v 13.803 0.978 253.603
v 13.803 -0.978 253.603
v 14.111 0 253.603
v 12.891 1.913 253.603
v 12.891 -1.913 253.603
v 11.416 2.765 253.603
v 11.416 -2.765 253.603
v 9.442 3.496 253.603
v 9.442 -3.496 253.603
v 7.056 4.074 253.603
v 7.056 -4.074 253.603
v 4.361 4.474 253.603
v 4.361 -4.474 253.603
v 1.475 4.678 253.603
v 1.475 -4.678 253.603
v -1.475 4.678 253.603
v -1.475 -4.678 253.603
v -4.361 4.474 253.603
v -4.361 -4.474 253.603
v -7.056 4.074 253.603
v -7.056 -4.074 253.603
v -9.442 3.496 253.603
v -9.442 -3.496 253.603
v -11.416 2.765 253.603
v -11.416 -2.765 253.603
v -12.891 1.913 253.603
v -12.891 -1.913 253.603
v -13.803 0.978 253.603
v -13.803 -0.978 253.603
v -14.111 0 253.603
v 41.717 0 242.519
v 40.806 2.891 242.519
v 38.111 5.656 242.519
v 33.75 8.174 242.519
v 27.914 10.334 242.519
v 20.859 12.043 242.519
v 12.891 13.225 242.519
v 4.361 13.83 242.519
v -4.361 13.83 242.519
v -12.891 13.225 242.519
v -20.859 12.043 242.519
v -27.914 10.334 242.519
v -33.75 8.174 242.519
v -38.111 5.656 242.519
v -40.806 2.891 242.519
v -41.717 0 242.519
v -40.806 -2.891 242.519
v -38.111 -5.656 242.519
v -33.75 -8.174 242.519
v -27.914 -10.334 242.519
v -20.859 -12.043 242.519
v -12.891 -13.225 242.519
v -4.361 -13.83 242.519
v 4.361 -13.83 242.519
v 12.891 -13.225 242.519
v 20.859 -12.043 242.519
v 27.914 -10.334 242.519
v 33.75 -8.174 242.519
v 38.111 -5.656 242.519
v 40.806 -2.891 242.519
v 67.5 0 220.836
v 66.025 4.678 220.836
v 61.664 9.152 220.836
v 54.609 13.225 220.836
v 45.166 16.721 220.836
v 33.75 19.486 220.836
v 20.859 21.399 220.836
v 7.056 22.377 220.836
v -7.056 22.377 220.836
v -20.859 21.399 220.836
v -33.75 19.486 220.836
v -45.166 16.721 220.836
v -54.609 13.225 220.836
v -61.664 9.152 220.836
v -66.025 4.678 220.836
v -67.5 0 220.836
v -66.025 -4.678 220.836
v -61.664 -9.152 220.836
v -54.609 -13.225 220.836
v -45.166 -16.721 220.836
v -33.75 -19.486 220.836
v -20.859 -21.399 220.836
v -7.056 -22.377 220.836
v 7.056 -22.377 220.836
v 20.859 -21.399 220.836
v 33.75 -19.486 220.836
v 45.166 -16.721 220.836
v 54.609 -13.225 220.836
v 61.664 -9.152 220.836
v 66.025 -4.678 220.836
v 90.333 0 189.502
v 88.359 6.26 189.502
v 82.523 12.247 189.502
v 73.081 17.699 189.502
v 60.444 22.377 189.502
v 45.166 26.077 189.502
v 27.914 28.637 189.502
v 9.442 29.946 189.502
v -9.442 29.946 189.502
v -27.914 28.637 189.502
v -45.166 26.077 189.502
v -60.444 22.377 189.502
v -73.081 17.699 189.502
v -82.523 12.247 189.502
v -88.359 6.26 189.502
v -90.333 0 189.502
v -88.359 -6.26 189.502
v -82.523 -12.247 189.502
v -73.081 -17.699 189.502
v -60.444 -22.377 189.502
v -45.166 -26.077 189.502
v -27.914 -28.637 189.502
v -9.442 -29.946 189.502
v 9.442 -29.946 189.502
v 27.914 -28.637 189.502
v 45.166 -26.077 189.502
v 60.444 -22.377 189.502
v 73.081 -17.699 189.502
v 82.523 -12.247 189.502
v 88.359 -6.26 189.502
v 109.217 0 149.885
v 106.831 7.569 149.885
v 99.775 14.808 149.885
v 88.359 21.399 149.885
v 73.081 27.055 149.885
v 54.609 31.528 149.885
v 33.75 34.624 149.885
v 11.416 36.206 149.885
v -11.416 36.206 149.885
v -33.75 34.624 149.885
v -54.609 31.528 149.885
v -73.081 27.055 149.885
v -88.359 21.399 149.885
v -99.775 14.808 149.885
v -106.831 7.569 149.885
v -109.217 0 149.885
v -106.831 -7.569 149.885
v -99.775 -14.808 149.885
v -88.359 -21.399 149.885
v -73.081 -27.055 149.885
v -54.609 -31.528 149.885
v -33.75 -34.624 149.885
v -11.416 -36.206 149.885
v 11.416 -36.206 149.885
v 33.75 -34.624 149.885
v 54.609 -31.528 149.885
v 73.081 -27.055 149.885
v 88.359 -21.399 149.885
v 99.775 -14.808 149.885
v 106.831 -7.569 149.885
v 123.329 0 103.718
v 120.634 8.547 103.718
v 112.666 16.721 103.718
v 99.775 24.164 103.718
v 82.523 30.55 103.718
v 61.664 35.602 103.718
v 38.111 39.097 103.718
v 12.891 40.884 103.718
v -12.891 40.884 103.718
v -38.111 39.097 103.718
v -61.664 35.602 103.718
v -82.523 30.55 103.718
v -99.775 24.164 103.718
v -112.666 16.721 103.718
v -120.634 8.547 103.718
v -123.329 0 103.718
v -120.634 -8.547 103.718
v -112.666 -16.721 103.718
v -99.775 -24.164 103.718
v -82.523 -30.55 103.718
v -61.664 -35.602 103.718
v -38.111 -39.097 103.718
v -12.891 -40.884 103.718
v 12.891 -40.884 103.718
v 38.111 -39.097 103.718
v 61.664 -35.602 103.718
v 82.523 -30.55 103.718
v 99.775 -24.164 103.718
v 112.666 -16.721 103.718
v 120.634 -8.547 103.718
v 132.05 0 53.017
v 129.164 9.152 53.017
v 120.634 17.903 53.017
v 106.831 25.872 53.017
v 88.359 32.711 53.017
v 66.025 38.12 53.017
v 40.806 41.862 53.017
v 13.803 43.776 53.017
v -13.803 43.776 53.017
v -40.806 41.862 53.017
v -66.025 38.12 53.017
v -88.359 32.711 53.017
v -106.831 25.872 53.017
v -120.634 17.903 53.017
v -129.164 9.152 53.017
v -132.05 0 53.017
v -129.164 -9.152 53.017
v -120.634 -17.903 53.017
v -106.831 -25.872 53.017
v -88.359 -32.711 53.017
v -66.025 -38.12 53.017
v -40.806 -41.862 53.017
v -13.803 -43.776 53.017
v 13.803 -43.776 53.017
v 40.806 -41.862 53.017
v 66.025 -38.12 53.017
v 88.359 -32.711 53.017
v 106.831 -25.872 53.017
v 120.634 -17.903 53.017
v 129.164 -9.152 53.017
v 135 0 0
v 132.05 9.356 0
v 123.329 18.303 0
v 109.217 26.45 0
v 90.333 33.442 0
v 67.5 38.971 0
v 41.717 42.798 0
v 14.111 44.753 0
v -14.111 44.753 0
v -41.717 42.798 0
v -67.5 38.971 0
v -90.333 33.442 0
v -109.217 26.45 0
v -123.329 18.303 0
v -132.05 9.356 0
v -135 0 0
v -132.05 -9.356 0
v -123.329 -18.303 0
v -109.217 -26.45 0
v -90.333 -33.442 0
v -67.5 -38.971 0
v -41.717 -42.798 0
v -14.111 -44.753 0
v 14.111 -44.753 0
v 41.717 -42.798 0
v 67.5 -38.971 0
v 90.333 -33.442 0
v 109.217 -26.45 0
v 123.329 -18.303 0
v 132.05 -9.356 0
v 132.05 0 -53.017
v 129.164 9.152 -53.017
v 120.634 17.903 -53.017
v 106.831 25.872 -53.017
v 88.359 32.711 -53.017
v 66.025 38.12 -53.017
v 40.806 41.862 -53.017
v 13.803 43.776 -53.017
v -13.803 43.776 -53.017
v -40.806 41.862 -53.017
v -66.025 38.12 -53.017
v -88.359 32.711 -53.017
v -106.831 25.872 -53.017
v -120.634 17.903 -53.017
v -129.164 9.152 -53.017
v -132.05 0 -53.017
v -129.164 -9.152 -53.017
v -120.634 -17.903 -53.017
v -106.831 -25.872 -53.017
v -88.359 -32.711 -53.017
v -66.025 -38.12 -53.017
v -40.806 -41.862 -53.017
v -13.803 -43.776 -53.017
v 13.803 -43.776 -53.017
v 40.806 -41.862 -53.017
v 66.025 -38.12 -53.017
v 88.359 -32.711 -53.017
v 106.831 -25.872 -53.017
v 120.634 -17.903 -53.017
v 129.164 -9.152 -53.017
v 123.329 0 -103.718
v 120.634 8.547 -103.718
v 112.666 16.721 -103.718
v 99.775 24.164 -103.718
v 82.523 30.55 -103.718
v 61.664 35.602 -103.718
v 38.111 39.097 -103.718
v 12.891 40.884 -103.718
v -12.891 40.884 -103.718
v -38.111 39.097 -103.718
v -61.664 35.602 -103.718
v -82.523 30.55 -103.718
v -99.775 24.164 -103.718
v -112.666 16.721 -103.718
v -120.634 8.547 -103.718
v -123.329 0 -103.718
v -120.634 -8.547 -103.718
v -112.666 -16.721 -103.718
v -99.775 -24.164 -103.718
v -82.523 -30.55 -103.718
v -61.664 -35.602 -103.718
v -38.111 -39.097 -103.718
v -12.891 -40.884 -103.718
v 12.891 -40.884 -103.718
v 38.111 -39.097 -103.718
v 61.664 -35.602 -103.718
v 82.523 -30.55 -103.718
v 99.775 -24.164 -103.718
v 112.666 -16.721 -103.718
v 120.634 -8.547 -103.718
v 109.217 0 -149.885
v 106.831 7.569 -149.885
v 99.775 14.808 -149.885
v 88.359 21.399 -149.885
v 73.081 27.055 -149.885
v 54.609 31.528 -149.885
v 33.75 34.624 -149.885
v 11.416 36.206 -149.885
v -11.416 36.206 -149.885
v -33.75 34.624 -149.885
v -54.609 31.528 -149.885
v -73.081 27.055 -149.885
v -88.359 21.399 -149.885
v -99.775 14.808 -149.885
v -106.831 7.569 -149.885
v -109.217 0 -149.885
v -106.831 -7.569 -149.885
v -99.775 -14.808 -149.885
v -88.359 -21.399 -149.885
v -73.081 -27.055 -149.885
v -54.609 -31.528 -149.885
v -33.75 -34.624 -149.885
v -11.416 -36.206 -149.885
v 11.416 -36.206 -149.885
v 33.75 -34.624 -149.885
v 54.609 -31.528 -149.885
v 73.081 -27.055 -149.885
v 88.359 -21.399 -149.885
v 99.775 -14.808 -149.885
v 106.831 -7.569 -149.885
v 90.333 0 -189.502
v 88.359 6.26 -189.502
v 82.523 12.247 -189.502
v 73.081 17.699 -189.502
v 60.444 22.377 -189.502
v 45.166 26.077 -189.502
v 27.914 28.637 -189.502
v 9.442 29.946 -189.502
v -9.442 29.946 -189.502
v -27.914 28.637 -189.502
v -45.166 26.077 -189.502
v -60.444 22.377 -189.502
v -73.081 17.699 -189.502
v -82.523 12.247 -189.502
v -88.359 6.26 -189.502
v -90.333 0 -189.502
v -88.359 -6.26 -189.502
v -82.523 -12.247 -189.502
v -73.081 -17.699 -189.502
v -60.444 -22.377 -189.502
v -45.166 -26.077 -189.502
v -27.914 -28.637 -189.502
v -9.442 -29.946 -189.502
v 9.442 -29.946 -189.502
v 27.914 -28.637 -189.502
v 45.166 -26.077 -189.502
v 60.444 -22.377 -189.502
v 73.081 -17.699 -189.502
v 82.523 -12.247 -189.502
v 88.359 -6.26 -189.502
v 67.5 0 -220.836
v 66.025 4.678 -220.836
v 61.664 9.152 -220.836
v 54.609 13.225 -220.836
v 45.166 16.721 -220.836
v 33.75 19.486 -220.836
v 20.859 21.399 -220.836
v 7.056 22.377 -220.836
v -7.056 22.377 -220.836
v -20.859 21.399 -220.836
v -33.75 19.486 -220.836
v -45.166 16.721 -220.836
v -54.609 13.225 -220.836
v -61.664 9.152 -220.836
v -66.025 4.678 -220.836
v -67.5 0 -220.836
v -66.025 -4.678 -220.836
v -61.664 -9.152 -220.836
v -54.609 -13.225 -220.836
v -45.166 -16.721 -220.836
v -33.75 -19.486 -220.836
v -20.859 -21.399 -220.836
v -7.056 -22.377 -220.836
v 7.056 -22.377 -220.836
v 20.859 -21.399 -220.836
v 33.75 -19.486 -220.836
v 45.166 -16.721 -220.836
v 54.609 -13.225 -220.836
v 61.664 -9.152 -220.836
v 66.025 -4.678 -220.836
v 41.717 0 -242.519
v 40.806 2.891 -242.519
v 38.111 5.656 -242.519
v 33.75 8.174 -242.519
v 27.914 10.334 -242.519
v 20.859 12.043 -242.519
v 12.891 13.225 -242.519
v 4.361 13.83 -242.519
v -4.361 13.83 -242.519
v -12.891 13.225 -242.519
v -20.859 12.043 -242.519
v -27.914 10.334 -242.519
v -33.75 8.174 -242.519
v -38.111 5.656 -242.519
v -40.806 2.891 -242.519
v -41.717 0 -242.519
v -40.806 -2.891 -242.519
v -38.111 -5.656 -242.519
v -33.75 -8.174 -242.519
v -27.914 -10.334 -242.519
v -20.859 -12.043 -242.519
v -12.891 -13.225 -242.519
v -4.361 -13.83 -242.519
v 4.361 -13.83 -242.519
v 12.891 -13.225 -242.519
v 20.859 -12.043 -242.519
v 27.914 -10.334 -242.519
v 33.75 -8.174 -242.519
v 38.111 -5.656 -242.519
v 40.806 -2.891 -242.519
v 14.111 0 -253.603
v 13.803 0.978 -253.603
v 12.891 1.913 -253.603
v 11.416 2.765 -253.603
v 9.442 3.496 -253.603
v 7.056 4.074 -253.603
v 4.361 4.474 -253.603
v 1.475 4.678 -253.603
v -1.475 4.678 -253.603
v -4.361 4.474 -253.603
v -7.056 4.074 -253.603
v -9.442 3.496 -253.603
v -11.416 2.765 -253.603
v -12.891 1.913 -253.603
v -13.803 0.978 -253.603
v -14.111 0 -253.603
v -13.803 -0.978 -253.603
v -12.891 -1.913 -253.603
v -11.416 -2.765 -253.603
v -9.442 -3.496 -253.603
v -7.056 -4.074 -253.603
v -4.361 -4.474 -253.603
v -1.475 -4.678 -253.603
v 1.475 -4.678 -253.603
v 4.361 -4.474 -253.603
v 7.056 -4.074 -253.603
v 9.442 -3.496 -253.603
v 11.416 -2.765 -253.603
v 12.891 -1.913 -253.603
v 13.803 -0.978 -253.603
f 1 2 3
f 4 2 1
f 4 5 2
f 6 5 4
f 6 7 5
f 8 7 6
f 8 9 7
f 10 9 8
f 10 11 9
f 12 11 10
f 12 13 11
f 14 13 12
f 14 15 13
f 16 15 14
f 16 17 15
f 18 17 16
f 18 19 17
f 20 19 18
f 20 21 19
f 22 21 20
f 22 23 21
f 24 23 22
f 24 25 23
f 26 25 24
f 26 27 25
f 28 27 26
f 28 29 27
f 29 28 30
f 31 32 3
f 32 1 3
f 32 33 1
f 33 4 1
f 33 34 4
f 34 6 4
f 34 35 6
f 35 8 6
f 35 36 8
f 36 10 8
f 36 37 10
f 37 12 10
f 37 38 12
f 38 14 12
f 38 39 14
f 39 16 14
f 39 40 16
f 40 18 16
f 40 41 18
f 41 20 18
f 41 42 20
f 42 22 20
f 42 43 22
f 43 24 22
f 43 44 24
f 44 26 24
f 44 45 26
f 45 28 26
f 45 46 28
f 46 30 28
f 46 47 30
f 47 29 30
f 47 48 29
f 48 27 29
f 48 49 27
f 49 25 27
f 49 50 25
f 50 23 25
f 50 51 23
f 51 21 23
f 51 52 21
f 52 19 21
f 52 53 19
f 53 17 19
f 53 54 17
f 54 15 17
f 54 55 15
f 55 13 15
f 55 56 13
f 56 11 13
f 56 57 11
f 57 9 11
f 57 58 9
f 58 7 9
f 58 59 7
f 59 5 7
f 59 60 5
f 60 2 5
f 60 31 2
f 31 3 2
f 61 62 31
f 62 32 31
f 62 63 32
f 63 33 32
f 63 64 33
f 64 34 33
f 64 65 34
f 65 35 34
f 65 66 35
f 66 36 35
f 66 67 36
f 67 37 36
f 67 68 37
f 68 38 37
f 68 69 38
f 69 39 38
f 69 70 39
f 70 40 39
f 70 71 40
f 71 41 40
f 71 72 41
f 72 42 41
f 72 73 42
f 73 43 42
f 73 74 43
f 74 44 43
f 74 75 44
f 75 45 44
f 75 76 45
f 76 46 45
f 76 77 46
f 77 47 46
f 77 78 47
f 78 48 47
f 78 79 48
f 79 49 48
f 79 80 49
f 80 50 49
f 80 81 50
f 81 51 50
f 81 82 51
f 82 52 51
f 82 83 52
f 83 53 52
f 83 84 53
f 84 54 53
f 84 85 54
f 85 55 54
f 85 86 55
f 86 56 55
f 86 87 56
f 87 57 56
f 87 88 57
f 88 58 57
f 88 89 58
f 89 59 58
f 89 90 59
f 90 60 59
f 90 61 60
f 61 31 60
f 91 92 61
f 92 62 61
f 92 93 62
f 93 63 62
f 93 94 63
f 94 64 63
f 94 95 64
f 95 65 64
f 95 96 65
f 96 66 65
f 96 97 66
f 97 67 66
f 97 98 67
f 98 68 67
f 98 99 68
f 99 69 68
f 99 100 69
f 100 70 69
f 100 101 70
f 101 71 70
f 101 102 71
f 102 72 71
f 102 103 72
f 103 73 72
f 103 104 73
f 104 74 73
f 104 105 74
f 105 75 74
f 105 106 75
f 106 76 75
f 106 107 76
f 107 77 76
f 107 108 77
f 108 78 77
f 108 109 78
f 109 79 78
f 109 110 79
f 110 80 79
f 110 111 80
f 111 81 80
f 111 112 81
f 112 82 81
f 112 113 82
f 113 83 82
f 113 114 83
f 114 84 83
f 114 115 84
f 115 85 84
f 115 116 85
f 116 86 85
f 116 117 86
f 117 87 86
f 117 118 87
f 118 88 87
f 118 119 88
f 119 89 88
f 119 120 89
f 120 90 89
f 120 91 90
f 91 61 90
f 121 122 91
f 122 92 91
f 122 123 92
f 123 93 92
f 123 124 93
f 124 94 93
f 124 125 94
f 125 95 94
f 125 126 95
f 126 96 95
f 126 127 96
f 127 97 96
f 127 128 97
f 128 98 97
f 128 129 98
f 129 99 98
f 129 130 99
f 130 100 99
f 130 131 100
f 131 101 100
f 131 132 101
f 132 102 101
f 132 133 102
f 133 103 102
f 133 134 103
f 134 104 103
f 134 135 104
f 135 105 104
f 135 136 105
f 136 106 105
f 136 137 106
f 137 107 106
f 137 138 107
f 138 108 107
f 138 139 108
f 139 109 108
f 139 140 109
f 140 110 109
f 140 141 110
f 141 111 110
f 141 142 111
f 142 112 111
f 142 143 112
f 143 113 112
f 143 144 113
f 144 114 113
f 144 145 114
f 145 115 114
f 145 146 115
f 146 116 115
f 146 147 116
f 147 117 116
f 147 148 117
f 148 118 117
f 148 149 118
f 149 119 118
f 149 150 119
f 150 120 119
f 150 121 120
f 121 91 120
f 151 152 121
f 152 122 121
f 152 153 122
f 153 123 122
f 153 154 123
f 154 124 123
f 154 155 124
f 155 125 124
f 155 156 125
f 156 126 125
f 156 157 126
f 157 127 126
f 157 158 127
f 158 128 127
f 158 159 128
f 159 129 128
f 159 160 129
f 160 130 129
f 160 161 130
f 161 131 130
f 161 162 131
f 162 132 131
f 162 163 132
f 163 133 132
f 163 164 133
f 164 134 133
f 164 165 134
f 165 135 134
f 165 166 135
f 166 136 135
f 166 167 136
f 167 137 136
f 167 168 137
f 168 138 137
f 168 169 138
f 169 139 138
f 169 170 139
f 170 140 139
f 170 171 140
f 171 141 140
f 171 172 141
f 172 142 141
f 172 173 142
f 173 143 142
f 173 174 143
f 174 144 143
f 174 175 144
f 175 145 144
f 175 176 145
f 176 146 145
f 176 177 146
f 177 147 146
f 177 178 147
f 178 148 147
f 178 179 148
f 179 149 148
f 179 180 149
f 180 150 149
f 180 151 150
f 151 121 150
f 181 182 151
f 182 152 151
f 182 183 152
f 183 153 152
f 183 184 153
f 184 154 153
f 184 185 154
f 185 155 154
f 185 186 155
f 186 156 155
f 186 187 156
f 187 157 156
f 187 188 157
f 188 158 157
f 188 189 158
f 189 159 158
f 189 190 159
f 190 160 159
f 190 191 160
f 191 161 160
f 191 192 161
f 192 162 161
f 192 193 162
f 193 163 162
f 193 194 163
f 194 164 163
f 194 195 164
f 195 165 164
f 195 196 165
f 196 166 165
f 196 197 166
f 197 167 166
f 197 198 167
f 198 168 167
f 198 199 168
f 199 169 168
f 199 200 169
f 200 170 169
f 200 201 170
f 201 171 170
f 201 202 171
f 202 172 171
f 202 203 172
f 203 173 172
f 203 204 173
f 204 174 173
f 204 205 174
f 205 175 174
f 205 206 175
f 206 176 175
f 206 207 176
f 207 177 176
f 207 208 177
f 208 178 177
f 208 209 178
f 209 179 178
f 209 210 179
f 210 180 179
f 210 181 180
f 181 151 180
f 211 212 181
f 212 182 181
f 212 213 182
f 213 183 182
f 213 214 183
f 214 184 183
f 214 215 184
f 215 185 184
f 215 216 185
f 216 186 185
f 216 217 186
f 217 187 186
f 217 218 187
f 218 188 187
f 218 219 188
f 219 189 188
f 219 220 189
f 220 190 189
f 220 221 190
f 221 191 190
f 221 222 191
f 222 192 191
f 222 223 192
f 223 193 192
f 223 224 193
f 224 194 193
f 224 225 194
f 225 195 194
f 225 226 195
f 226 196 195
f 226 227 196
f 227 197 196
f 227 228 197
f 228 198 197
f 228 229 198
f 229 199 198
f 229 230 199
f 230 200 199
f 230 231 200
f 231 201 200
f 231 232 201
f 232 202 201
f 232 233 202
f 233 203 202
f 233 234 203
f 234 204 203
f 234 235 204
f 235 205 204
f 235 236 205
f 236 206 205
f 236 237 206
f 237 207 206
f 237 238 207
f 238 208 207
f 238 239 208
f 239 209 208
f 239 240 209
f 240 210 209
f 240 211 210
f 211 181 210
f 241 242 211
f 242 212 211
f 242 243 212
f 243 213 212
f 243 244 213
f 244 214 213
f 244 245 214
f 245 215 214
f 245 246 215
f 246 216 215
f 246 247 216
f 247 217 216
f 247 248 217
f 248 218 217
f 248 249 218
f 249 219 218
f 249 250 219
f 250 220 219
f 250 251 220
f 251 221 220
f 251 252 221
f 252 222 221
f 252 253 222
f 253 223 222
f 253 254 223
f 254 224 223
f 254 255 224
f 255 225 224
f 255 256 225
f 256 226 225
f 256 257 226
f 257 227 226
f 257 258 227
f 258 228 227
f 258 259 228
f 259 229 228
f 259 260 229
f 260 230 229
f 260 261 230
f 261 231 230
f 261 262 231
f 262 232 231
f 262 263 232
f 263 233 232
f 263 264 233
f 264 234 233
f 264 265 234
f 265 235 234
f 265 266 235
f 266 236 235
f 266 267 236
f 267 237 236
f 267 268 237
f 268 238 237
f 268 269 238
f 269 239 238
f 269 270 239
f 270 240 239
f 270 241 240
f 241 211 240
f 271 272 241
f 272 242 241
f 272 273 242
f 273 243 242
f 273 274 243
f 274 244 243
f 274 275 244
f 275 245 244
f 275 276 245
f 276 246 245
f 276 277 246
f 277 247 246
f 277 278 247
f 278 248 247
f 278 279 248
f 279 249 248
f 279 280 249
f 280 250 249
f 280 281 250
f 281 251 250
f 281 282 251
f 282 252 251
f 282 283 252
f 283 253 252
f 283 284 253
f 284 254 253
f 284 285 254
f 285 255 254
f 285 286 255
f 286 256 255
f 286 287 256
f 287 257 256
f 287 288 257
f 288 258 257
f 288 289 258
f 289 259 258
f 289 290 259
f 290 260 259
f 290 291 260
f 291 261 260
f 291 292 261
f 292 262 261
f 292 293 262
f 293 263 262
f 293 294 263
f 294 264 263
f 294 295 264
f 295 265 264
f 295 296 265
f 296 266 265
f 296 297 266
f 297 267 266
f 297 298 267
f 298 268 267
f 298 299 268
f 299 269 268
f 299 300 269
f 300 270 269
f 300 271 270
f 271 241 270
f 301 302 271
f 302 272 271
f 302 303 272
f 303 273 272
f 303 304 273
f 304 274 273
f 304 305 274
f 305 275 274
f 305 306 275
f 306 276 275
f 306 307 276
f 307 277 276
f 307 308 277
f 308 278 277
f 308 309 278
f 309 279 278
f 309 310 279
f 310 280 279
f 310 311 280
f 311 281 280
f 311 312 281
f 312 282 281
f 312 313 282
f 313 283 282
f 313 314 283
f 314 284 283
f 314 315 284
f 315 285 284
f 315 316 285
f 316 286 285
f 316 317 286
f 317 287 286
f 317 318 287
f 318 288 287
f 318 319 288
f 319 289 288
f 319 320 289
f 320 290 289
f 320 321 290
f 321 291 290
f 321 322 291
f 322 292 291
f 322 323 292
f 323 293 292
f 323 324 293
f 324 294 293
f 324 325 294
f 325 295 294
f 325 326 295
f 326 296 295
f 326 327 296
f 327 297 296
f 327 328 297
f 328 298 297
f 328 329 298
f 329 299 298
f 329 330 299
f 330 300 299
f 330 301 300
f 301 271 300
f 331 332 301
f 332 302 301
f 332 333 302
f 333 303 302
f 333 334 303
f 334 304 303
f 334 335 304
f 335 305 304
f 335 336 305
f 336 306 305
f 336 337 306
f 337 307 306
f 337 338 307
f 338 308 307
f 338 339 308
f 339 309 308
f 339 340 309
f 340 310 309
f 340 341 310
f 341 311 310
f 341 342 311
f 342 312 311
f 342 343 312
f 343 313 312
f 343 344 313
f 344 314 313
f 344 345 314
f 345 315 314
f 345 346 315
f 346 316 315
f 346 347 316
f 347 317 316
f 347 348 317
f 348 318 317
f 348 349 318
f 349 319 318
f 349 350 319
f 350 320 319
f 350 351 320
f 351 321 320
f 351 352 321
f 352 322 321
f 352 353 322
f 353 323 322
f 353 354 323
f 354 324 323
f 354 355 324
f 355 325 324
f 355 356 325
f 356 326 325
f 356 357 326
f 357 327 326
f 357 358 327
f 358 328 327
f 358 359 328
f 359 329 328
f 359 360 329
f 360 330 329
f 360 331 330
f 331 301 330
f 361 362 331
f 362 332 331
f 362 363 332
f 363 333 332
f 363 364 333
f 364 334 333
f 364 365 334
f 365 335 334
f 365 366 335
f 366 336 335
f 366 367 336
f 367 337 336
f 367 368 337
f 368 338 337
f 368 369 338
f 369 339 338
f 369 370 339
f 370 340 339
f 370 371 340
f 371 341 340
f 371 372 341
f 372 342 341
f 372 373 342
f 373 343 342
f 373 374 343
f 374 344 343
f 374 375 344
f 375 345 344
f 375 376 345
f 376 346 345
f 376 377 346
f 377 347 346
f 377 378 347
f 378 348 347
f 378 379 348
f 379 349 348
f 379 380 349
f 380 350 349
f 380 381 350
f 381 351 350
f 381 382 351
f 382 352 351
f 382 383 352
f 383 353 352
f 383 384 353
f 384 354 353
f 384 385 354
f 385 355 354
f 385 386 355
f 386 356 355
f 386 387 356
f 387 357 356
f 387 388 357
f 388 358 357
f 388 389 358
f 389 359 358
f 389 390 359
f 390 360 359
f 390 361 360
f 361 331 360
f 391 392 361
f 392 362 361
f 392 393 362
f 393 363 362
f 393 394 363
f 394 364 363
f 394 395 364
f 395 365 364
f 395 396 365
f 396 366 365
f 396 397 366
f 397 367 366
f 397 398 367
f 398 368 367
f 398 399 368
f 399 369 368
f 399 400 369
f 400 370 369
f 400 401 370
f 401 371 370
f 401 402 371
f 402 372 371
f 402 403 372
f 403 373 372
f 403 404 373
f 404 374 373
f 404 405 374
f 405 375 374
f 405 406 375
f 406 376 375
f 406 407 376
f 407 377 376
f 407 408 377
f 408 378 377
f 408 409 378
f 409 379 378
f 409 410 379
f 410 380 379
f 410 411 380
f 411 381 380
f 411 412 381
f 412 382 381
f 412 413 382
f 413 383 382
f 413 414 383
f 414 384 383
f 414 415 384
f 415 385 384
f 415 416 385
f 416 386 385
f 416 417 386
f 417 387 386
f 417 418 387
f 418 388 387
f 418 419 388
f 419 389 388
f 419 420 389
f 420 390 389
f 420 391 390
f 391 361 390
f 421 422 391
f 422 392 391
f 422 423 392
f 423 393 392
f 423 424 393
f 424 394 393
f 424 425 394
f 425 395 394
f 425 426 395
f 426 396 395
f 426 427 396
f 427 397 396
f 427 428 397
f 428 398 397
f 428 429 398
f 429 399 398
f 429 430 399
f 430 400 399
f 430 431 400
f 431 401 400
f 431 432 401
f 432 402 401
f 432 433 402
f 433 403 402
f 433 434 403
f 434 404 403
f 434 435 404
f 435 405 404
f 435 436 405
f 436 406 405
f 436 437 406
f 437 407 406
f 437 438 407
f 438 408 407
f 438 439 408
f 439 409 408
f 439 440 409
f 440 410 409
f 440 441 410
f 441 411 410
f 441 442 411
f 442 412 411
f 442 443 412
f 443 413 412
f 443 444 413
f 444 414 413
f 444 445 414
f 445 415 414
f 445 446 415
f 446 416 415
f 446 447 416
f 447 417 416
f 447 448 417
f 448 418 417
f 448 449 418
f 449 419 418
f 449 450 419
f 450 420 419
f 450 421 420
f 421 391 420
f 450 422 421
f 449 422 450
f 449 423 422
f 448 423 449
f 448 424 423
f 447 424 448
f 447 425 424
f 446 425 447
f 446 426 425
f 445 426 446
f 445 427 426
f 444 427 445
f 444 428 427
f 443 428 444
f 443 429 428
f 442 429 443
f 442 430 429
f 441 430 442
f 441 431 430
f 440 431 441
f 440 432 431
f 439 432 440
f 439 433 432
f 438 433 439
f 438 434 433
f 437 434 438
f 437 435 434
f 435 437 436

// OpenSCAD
// Generated by SolidPython 1.0.1 on 2020-07-29 00:46:48


scale(v = [9, 3, 17]) {
	sphere(r = 15);
}
/***********************************************
*********      SolidPython code:      **********
************************************************
 
# import packages: SolidPython
from solid import *
from solid.utils import *
from itertools import chain, combinations, permutations


class Resize:

    def __init__(self, scad_file):
        self.scad_file = scad_file
        #self.scad_file = import_scad(scad_file)
        # cone/cylinder param:
        self.r1 = 0
        self.r2 = 0
        self.h = 0
        # rectangular prism param:
        self.w = 0
        self.l = 0
        # ellipse param:
        self.r = 0

    # import OpenScad code (file name corresponds to shape)


    # classify shape + parameters
    def assign(self, param1, param2, param3):
        if self.scad_file == 'cone.scad':
            self.r1 = param1
            self.r2 = param2
            self.h = param3
        elif self.scad_file == 'cylinder.scad':
            self.r1 = param1
            self.r2 = param2
            self.h = param3
        elif self.scad_file == 'rectangularPrism.scad':
            self.h = param1
            self.l = param2
            self.w = param3
        else:
            self.r = param1
            self.h = param2

    # resize parameters
    def iterate(self):
        x = range(3, 20, 2)
        i = 1
        if self.scad_file == 'cone.scad':
            tempList = list(permutations(x, 2))
            for temp in tempList:
                param1 = temp[0]
                param2 = temp[1]
                filepath = 'produced_scad_files/' + 'cone' + str(param1) + '_' + str(param2) + '_' + '.scad'
                scad_render_to_file(cylinder(h=param1, r1=param2, r2=0), filepath)

        elif self.scad_file == 'cylinder.scad':
            tempList = list(permutations(x, 3))
            for temp in tempList:
                param1 = temp[0]
                param2 = temp[1]
                filepath = 'produced_scad_files/' + 'cylinder' + str(param1) + '_' + str(param2) + '_' + '.scad'
                scad_render_to_file(cylinder(h=param1, r1=param2, r2=param2), filepath)

        elif self.scad_file == 'rectangularPrism.scad':
            tempList = list(permutations(x, 3))
            for temp in tempList:
                param1 = temp[0]
                param2 = temp[1]
                param3 = temp[2]
                filepath = 'produced_scad_files/' + 'rectangularPrism' + str(param1) + '_' + str(param2) + '_' + str(
                    param3) + '.scad'
                scad_render_to_file(cube(size=(param1, param2, param3)), filepath)

        elif self.scad_file == 'ellipse.scad':
            tempList = list(permutations(x, 4))
            for temp in tempList:
                param1 = temp[0]
                param2 = temp[1]
                param3 = temp[2]
                param4 = temp[3]
                filepath = 'produced_scad_files/' + 'ellipse' + str(param1) + '_' + str(param2) + '_' + str(param3) + '_' + str(param4) + '.scad'
                scad_render_to_file(scale([param1, param2, param3])(sphere(r=param4)), filepath)

    def render_to_scadfile(self):
        scad_render_to_file(scad, 'example.scad') 
 
************************************************/
